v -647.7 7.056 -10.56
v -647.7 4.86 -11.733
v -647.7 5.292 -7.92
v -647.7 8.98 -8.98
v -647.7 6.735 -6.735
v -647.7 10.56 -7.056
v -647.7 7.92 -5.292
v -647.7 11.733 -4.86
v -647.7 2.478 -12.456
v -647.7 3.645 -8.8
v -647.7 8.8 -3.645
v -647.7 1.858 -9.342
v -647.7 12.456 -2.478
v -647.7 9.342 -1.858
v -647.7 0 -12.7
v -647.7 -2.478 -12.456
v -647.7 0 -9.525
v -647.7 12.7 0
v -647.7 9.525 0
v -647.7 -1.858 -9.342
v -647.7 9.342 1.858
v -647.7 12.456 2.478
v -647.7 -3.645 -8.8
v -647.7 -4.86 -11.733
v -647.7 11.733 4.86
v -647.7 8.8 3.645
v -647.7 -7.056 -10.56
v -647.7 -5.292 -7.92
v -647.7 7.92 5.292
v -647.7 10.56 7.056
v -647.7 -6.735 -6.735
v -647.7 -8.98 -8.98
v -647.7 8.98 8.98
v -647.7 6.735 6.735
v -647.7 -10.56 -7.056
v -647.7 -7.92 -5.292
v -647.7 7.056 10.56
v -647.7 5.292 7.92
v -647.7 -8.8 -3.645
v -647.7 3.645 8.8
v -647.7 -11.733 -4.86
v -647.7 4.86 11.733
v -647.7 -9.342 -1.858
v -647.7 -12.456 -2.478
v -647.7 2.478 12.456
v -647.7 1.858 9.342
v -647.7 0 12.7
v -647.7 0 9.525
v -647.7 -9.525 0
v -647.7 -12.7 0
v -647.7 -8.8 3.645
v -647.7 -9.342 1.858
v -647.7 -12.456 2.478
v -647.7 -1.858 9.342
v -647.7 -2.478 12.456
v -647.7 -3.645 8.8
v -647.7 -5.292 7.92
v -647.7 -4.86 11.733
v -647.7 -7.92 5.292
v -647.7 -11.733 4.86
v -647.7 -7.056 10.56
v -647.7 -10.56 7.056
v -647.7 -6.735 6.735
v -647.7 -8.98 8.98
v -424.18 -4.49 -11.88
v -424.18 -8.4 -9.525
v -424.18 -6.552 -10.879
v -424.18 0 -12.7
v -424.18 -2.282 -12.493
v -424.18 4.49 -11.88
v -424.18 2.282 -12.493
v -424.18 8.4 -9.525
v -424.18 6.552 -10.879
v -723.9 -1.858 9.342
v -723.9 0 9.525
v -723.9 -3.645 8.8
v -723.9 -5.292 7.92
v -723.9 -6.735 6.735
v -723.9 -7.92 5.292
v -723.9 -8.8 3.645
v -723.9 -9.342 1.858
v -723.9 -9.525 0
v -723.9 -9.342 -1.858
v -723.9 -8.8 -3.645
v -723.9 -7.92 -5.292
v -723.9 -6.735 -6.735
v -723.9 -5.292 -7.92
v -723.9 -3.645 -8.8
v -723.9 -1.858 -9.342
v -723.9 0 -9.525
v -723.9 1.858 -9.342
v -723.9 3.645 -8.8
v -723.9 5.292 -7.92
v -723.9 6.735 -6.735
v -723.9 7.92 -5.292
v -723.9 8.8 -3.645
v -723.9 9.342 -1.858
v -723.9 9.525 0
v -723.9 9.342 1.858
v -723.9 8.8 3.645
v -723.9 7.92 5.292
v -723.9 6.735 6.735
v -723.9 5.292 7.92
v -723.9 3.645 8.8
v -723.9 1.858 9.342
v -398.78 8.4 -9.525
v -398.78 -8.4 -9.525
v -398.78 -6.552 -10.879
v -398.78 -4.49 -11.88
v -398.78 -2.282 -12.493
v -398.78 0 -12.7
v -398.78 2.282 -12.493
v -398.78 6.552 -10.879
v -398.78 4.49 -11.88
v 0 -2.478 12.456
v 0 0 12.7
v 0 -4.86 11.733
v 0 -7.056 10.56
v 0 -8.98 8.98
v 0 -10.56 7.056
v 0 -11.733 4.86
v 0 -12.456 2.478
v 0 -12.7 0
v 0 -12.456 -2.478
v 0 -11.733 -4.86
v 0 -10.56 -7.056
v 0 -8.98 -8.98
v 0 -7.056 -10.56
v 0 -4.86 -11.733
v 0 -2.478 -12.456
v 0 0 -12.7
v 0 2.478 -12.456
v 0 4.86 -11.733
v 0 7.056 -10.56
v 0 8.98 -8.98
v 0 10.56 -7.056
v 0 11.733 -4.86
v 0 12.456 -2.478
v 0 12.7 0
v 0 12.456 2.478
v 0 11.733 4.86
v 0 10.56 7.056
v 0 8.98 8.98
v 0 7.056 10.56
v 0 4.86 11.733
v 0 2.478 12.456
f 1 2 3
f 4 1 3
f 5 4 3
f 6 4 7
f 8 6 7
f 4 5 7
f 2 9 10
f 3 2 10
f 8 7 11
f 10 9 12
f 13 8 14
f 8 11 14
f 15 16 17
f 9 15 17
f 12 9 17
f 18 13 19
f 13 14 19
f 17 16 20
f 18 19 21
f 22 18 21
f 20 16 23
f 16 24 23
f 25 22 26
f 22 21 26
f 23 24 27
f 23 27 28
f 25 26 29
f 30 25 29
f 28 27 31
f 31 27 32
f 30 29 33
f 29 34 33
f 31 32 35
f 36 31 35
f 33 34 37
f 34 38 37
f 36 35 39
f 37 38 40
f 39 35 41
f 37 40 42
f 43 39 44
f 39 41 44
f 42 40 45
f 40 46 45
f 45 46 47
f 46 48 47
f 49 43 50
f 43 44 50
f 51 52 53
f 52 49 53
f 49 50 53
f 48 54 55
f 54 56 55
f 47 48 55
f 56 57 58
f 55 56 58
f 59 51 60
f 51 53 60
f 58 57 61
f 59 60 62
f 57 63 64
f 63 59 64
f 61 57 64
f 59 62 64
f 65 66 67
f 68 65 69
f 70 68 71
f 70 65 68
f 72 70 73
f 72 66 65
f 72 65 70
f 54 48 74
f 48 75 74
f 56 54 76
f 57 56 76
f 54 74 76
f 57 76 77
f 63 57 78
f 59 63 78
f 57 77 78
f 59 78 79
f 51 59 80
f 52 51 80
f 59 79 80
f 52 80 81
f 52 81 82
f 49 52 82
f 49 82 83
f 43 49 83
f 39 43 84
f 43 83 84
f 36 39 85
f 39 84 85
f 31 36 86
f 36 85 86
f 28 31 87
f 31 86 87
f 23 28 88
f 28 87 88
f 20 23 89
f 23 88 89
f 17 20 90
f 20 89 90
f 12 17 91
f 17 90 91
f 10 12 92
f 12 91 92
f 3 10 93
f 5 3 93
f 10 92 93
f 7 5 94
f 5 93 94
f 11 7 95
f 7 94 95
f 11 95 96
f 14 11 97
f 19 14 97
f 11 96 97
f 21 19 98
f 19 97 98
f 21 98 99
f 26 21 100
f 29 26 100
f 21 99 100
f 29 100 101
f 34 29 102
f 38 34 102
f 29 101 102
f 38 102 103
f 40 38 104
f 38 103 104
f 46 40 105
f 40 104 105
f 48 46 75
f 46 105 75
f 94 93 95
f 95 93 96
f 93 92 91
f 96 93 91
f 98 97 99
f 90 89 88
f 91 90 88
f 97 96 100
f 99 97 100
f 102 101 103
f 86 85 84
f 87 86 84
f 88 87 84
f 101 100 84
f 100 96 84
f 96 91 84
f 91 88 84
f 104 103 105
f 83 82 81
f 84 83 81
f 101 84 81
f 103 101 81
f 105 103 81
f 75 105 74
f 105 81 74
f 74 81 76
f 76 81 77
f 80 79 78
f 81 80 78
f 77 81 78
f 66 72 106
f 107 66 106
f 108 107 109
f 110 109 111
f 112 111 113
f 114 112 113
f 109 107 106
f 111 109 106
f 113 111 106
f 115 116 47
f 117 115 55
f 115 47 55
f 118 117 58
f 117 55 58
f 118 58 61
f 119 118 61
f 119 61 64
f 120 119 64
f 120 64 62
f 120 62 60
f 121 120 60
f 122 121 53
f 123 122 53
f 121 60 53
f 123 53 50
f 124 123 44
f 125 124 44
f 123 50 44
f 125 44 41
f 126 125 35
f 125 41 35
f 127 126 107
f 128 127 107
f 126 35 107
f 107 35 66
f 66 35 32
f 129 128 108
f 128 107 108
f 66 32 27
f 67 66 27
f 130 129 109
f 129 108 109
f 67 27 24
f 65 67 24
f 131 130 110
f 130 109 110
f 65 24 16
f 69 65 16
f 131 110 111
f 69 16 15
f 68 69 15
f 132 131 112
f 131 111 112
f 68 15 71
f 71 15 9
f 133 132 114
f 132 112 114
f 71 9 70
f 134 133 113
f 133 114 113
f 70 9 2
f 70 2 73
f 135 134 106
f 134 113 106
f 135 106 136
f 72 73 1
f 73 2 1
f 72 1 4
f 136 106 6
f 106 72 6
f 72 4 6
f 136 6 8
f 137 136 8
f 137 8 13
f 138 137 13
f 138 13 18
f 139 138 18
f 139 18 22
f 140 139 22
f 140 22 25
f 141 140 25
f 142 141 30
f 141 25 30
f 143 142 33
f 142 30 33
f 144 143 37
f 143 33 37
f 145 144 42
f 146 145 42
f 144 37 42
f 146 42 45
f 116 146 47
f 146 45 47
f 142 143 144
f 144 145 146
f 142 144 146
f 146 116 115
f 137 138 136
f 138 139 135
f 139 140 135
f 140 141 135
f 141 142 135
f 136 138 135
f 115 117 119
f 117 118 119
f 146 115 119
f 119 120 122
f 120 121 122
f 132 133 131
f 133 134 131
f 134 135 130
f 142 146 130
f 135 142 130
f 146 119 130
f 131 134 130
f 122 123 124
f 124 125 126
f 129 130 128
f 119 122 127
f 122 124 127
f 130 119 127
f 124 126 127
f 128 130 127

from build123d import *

# Parameters (mm, degrees)
SKETCH3_W               = 25.4
SKETCH3_H               = 3.175
CUT_EXTRUDE1_DEPTH      = 725.12277274
CUT_EXTRUDE1_DEPTH_BACK = 725.12277274


with BuildPart() as part:
    # Sketch2 → Revolve1 (revolve)
    with BuildSketch(Plane(origin=(0, 0, 0), x_dir=(1, 0, 0), z_dir=(0, 1, 0)), mode=Mode.PRIVATE) as revolve1_sk:
        Polygon((-723.9, 9.525), (-723.9, 0), (0, 0), (0, 12.7), (-647.7, 12.7), (-647.7, 9.525), align=None)
    revolve(revolve1_sk.sketch.rotate(Axis((-723.9, 0, 0), (1, 0, 0)), 180), axis=Axis((-723.9, 0, 0), (1, 0, 0)))

    # Sketch3 → Cut-Extrude1 (cut, two sides)
    with BuildSketch(Plane(origin=(0, 0, 0), x_dir=(1, 0, 0), z_dir=(0, 1, 0))) as cut_extrude1_sk:
        with Locations((-411.48, 11.1125)):
            Rectangle(SKETCH3_W, SKETCH3_H)
    extrude(amount=CUT_EXTRUDE1_DEPTH, mode=Mode.SUBTRACT)
    extrude(cut_extrude1_sk.sketch, amount=-CUT_EXTRUDE1_DEPTH_BACK, mode=Mode.SUBTRACT)


solid = part.part
